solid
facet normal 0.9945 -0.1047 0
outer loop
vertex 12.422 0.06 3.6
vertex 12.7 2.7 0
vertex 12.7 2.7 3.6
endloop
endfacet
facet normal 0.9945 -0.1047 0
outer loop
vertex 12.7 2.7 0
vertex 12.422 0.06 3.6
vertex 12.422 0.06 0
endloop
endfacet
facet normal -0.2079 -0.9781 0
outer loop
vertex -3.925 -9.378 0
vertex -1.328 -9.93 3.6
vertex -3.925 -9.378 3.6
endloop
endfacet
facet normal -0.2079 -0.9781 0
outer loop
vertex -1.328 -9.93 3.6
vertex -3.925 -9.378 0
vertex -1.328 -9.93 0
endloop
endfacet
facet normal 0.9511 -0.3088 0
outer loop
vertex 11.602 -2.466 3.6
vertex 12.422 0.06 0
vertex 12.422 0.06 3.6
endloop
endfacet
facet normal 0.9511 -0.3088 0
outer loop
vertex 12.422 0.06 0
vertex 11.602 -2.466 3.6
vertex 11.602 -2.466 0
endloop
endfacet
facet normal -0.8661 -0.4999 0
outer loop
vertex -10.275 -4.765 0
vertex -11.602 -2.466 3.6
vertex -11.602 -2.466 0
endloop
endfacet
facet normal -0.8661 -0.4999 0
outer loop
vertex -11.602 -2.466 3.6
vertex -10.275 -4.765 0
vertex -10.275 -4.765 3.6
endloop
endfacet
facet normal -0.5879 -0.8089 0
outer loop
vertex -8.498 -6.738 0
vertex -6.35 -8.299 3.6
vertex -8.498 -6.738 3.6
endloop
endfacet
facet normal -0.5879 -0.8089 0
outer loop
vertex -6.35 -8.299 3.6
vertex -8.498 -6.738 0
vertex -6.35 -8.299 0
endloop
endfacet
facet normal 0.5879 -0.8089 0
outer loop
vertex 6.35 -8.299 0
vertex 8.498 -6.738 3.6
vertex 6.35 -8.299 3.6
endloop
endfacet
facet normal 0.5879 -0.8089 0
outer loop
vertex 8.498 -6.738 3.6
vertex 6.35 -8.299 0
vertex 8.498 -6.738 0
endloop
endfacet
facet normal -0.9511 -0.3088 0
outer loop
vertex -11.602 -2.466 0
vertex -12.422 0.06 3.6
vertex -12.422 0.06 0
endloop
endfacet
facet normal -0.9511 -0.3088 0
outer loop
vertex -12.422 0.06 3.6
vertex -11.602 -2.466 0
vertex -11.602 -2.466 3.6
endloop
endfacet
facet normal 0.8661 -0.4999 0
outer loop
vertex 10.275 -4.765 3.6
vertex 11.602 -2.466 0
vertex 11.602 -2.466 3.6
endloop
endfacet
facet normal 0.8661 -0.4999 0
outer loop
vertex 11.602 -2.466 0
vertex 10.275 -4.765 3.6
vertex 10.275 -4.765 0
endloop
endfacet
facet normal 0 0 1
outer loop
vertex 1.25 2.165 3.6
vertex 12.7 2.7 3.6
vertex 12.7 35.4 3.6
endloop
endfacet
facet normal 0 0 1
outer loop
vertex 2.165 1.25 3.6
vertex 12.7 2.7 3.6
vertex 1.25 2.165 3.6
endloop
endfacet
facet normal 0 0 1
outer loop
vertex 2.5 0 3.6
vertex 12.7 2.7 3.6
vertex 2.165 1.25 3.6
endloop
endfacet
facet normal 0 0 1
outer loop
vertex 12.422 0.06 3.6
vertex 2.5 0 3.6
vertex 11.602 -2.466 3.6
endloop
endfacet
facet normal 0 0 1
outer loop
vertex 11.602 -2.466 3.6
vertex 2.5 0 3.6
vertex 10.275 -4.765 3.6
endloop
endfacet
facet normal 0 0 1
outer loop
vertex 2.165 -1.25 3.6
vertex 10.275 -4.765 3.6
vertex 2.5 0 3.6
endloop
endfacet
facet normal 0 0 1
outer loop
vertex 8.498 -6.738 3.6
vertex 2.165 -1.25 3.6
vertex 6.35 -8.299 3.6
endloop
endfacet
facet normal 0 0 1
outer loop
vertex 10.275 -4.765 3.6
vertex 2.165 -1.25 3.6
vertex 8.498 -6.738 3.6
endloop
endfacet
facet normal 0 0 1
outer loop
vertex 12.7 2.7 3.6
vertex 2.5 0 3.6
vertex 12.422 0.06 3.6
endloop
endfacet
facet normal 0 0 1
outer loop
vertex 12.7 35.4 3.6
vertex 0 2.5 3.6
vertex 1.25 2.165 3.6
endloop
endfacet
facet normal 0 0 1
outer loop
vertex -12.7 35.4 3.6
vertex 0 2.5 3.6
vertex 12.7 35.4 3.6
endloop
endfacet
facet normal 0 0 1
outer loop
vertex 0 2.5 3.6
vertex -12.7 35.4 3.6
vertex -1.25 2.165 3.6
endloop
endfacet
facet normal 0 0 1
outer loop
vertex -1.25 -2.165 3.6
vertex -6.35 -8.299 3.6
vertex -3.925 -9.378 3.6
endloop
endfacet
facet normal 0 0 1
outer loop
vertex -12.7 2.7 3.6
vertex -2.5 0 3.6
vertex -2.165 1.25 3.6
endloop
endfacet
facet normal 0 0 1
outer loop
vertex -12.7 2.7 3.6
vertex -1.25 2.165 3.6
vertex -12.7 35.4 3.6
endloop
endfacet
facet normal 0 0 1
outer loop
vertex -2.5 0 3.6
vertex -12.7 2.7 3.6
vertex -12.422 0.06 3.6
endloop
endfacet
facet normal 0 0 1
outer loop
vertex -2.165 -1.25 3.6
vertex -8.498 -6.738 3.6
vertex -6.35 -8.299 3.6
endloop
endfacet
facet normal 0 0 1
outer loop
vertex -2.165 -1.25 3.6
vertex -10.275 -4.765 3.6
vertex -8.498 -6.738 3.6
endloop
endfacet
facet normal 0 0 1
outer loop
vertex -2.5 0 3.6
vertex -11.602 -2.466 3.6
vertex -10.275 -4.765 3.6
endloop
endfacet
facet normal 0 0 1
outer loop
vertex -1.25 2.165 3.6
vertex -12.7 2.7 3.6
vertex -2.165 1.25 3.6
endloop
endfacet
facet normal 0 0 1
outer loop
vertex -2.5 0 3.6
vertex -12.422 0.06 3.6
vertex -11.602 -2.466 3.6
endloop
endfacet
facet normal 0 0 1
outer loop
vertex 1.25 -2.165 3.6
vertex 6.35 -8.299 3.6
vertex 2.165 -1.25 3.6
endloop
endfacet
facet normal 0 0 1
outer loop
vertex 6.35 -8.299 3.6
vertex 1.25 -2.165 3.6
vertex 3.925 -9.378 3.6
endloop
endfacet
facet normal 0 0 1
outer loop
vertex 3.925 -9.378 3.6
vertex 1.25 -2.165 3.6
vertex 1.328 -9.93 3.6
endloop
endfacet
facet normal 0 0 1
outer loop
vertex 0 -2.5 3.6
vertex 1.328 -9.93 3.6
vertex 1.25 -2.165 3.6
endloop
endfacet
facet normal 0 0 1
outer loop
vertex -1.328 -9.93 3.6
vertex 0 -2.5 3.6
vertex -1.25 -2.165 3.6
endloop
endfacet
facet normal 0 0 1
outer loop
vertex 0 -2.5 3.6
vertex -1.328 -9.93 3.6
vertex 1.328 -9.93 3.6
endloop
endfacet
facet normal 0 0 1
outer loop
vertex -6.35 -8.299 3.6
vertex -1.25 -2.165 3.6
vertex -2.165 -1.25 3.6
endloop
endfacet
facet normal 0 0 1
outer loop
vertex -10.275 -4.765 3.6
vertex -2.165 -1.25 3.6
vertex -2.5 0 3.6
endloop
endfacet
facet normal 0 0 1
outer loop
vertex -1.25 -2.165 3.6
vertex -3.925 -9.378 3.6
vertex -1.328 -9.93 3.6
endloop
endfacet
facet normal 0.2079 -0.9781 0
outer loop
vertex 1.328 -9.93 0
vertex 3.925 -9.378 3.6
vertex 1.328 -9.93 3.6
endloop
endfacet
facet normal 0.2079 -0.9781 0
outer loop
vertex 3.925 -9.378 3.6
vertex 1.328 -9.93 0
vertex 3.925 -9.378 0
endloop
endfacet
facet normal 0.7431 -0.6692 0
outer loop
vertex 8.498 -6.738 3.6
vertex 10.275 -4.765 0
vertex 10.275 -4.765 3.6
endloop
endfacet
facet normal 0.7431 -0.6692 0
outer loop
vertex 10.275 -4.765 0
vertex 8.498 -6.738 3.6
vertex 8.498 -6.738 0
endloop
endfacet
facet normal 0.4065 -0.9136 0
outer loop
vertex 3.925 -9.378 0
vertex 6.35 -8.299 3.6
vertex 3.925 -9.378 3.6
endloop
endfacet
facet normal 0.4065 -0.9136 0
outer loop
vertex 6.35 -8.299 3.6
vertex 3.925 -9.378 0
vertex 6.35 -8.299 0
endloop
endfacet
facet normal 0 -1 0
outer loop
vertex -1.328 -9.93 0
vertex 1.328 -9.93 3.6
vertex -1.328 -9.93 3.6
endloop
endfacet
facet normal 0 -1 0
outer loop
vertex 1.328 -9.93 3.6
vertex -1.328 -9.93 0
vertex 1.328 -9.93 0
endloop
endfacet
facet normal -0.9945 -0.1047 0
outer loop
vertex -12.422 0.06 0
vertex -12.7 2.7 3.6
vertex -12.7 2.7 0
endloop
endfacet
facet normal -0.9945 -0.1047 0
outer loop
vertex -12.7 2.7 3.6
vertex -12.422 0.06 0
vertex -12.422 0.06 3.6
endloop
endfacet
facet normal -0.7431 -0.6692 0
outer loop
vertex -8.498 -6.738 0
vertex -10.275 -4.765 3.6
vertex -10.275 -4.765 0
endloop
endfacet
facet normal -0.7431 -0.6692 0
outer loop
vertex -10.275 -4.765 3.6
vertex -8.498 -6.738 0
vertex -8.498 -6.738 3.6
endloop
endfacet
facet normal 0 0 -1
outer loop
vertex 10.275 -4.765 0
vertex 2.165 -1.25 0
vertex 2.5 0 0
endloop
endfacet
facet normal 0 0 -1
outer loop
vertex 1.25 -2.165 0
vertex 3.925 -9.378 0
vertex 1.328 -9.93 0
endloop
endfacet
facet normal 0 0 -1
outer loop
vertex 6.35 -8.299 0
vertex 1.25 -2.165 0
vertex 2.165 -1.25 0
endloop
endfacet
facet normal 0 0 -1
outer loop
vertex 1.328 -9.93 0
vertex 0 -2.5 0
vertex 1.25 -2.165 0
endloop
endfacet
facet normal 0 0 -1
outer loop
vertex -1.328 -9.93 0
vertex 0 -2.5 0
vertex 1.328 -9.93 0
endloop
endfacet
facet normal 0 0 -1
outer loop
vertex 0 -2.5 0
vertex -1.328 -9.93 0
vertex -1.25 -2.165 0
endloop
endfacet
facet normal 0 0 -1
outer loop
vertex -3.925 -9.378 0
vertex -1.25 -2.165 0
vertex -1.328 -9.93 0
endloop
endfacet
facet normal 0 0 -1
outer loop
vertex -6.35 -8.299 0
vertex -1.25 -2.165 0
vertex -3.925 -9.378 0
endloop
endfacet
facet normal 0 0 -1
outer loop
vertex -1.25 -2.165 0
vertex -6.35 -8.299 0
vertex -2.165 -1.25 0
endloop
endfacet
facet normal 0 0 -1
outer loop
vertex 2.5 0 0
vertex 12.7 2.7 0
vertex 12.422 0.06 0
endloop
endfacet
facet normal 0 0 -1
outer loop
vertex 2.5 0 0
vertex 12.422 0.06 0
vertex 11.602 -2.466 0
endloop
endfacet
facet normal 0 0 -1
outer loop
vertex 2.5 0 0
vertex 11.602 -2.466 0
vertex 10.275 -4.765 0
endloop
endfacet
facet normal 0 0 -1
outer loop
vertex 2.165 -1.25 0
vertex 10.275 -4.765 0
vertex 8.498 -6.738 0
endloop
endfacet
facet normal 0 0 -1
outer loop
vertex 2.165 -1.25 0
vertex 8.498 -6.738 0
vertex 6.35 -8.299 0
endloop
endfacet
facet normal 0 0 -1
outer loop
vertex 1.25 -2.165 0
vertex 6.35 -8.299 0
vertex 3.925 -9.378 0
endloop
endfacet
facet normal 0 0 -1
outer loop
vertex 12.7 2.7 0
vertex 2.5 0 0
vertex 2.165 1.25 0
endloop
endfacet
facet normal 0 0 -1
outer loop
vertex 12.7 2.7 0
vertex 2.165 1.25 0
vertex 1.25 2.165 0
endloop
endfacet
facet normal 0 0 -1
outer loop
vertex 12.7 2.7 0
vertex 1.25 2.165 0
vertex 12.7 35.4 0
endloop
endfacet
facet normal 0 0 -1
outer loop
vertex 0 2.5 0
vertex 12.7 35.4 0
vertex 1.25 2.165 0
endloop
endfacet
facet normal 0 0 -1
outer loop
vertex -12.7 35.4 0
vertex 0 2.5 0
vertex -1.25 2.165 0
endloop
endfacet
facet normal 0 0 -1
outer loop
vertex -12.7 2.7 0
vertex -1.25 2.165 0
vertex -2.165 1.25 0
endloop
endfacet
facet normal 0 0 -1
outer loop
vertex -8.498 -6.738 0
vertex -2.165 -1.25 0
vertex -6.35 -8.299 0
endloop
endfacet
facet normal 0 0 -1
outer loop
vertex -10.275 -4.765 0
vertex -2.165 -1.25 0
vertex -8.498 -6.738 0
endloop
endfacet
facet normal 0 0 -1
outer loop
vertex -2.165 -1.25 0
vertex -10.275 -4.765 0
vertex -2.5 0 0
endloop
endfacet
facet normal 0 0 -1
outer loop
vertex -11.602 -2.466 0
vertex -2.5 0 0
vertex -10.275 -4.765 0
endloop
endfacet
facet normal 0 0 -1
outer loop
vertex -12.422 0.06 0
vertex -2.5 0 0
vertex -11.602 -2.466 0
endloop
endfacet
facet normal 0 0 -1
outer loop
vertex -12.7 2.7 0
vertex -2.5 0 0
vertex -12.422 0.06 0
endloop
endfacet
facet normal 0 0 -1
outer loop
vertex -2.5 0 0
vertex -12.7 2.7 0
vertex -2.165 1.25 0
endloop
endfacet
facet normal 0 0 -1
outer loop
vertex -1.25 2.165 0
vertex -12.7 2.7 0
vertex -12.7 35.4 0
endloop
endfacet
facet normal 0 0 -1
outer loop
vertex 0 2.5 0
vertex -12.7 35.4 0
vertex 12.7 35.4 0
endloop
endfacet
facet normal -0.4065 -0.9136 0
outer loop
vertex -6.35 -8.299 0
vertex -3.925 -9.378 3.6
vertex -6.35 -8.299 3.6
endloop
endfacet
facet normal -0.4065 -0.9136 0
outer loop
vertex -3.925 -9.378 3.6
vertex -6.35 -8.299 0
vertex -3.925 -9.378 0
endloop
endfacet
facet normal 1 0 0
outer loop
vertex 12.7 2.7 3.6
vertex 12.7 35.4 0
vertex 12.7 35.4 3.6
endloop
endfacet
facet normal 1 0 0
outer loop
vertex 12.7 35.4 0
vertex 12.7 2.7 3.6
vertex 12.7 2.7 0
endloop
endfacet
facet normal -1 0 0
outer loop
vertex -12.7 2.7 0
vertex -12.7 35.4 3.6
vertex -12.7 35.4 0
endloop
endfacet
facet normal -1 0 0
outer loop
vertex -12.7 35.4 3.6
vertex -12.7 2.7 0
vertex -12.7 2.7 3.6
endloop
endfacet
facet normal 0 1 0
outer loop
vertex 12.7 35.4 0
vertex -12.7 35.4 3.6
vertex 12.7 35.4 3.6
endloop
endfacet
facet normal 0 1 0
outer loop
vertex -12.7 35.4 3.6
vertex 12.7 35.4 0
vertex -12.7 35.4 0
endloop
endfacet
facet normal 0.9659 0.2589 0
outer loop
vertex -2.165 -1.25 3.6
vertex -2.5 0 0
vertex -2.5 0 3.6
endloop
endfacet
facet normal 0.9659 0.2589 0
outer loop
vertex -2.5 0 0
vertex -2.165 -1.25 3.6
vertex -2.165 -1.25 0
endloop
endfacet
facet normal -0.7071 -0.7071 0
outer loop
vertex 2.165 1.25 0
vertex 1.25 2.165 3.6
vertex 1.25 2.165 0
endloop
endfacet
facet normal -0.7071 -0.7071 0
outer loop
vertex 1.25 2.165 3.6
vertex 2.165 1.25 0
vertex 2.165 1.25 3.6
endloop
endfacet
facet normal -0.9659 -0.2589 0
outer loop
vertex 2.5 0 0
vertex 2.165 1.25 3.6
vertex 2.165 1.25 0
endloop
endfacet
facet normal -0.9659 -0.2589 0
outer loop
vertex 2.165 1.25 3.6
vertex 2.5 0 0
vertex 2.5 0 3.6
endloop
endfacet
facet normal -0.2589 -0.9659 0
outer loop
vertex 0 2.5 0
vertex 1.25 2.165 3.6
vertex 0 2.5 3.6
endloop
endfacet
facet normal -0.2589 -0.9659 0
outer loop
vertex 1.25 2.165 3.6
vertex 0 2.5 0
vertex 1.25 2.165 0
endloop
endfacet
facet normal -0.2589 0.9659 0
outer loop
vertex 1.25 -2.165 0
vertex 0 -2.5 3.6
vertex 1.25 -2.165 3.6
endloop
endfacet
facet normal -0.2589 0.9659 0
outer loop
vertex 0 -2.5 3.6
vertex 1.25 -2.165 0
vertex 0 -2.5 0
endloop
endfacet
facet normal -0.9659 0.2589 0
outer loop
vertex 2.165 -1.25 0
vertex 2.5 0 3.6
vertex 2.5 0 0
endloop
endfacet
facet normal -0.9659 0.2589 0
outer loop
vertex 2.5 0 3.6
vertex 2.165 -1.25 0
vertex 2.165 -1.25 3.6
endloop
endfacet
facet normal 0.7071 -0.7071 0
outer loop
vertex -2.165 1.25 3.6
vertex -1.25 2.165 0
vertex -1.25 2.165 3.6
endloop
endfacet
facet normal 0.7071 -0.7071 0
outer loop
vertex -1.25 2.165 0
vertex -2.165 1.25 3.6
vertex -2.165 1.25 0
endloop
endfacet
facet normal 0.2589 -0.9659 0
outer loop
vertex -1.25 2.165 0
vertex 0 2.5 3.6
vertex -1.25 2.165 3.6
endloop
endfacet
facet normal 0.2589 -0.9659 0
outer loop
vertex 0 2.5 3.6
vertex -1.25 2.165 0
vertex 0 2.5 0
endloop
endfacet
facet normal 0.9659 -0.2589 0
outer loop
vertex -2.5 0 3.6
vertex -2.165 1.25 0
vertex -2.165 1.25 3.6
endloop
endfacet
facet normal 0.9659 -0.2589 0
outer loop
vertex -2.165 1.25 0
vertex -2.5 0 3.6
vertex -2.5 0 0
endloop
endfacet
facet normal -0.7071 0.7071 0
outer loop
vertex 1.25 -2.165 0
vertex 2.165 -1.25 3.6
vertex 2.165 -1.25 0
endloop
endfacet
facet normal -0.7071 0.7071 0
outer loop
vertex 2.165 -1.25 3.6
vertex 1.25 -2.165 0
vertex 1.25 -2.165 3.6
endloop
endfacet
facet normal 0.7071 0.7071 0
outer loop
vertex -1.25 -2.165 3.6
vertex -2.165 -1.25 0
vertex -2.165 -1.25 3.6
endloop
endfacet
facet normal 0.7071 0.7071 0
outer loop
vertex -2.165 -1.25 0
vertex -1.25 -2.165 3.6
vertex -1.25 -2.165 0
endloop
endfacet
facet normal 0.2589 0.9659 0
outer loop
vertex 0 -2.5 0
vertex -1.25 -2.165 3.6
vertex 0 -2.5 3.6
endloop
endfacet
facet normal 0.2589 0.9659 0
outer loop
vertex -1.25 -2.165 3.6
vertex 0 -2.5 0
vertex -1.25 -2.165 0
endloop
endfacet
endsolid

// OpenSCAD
// file: configuration.scad
// Increase this if your slicer or printer make holes too tight.
extra_radius = 0.1;

// OD = outside diameter, corner to corner.
m3_nut_od = 6.1;
m3_nut_radius = m3_nut_od/2 + 0.2 + extra_radius;
m3_washer_radius = 3.5 + extra_radius;

// Major diameter of metric 3mm thread.
m3_major = 2.85;
m3_radius = m3_major/2 + extra_radius;
m3_wide_radius = m3_major/2 + extra_radius + 0.2;

// NEMA17 stepper motors.
motor_shaft_diameter = 5;
motor_shaft_radius = motor_shaft_diameter/2 + extra_radius;

// Frame brackets. M3x8mm screws work best with 3.6 mm brackets.
thickness = 3.6;

// OpenBeam or Misumi. Currently only 15x15 mm, but there is a plan
// to make models more parametric and allow 20x20 mm in the future.
extrusion = 15;

// Placement for the NEMA17 stepper motors.
motor_offset = 44;
motor_length = 47;
// main file
include <configuration.scad>;

sticky_width = 25.4;
sticky_length = 25.4;
sticky_offset = 10;  // Distance from screw center to glass edge.
m5_wide_radius = 2.5;

// Make the round edge line up with the outside of OpenBeam.
screw_offset = sticky_width/2 - 10;
cube_length = sticky_length + sticky_offset - screw_offset;

module glass_tab() {
  difference() {
    translate([0, screw_offset, 0]) union() {
      cylinder(r=sticky_width/2, h=thickness, center=true);
      translate([0, cube_length/2, 0])
        cube([sticky_width, cube_length, thickness], center=true);
    }
    cylinder(r=m5_wide_radius, h=20, center=true, $fn=12);
  }
  // Scotch restickable tab for mounting.
  translate([0, sticky_length/2+sticky_offset, thickness/2]) %
    cube([sticky_width, sticky_length, 0.7], center=true);
  // Horizontal OpenBeam.
  translate([0, 0, (20+thickness)/-2]) %
    cube([100, 20, 20], center=true);
}

translate([0, 0, thickness/2]) glass_tab();
